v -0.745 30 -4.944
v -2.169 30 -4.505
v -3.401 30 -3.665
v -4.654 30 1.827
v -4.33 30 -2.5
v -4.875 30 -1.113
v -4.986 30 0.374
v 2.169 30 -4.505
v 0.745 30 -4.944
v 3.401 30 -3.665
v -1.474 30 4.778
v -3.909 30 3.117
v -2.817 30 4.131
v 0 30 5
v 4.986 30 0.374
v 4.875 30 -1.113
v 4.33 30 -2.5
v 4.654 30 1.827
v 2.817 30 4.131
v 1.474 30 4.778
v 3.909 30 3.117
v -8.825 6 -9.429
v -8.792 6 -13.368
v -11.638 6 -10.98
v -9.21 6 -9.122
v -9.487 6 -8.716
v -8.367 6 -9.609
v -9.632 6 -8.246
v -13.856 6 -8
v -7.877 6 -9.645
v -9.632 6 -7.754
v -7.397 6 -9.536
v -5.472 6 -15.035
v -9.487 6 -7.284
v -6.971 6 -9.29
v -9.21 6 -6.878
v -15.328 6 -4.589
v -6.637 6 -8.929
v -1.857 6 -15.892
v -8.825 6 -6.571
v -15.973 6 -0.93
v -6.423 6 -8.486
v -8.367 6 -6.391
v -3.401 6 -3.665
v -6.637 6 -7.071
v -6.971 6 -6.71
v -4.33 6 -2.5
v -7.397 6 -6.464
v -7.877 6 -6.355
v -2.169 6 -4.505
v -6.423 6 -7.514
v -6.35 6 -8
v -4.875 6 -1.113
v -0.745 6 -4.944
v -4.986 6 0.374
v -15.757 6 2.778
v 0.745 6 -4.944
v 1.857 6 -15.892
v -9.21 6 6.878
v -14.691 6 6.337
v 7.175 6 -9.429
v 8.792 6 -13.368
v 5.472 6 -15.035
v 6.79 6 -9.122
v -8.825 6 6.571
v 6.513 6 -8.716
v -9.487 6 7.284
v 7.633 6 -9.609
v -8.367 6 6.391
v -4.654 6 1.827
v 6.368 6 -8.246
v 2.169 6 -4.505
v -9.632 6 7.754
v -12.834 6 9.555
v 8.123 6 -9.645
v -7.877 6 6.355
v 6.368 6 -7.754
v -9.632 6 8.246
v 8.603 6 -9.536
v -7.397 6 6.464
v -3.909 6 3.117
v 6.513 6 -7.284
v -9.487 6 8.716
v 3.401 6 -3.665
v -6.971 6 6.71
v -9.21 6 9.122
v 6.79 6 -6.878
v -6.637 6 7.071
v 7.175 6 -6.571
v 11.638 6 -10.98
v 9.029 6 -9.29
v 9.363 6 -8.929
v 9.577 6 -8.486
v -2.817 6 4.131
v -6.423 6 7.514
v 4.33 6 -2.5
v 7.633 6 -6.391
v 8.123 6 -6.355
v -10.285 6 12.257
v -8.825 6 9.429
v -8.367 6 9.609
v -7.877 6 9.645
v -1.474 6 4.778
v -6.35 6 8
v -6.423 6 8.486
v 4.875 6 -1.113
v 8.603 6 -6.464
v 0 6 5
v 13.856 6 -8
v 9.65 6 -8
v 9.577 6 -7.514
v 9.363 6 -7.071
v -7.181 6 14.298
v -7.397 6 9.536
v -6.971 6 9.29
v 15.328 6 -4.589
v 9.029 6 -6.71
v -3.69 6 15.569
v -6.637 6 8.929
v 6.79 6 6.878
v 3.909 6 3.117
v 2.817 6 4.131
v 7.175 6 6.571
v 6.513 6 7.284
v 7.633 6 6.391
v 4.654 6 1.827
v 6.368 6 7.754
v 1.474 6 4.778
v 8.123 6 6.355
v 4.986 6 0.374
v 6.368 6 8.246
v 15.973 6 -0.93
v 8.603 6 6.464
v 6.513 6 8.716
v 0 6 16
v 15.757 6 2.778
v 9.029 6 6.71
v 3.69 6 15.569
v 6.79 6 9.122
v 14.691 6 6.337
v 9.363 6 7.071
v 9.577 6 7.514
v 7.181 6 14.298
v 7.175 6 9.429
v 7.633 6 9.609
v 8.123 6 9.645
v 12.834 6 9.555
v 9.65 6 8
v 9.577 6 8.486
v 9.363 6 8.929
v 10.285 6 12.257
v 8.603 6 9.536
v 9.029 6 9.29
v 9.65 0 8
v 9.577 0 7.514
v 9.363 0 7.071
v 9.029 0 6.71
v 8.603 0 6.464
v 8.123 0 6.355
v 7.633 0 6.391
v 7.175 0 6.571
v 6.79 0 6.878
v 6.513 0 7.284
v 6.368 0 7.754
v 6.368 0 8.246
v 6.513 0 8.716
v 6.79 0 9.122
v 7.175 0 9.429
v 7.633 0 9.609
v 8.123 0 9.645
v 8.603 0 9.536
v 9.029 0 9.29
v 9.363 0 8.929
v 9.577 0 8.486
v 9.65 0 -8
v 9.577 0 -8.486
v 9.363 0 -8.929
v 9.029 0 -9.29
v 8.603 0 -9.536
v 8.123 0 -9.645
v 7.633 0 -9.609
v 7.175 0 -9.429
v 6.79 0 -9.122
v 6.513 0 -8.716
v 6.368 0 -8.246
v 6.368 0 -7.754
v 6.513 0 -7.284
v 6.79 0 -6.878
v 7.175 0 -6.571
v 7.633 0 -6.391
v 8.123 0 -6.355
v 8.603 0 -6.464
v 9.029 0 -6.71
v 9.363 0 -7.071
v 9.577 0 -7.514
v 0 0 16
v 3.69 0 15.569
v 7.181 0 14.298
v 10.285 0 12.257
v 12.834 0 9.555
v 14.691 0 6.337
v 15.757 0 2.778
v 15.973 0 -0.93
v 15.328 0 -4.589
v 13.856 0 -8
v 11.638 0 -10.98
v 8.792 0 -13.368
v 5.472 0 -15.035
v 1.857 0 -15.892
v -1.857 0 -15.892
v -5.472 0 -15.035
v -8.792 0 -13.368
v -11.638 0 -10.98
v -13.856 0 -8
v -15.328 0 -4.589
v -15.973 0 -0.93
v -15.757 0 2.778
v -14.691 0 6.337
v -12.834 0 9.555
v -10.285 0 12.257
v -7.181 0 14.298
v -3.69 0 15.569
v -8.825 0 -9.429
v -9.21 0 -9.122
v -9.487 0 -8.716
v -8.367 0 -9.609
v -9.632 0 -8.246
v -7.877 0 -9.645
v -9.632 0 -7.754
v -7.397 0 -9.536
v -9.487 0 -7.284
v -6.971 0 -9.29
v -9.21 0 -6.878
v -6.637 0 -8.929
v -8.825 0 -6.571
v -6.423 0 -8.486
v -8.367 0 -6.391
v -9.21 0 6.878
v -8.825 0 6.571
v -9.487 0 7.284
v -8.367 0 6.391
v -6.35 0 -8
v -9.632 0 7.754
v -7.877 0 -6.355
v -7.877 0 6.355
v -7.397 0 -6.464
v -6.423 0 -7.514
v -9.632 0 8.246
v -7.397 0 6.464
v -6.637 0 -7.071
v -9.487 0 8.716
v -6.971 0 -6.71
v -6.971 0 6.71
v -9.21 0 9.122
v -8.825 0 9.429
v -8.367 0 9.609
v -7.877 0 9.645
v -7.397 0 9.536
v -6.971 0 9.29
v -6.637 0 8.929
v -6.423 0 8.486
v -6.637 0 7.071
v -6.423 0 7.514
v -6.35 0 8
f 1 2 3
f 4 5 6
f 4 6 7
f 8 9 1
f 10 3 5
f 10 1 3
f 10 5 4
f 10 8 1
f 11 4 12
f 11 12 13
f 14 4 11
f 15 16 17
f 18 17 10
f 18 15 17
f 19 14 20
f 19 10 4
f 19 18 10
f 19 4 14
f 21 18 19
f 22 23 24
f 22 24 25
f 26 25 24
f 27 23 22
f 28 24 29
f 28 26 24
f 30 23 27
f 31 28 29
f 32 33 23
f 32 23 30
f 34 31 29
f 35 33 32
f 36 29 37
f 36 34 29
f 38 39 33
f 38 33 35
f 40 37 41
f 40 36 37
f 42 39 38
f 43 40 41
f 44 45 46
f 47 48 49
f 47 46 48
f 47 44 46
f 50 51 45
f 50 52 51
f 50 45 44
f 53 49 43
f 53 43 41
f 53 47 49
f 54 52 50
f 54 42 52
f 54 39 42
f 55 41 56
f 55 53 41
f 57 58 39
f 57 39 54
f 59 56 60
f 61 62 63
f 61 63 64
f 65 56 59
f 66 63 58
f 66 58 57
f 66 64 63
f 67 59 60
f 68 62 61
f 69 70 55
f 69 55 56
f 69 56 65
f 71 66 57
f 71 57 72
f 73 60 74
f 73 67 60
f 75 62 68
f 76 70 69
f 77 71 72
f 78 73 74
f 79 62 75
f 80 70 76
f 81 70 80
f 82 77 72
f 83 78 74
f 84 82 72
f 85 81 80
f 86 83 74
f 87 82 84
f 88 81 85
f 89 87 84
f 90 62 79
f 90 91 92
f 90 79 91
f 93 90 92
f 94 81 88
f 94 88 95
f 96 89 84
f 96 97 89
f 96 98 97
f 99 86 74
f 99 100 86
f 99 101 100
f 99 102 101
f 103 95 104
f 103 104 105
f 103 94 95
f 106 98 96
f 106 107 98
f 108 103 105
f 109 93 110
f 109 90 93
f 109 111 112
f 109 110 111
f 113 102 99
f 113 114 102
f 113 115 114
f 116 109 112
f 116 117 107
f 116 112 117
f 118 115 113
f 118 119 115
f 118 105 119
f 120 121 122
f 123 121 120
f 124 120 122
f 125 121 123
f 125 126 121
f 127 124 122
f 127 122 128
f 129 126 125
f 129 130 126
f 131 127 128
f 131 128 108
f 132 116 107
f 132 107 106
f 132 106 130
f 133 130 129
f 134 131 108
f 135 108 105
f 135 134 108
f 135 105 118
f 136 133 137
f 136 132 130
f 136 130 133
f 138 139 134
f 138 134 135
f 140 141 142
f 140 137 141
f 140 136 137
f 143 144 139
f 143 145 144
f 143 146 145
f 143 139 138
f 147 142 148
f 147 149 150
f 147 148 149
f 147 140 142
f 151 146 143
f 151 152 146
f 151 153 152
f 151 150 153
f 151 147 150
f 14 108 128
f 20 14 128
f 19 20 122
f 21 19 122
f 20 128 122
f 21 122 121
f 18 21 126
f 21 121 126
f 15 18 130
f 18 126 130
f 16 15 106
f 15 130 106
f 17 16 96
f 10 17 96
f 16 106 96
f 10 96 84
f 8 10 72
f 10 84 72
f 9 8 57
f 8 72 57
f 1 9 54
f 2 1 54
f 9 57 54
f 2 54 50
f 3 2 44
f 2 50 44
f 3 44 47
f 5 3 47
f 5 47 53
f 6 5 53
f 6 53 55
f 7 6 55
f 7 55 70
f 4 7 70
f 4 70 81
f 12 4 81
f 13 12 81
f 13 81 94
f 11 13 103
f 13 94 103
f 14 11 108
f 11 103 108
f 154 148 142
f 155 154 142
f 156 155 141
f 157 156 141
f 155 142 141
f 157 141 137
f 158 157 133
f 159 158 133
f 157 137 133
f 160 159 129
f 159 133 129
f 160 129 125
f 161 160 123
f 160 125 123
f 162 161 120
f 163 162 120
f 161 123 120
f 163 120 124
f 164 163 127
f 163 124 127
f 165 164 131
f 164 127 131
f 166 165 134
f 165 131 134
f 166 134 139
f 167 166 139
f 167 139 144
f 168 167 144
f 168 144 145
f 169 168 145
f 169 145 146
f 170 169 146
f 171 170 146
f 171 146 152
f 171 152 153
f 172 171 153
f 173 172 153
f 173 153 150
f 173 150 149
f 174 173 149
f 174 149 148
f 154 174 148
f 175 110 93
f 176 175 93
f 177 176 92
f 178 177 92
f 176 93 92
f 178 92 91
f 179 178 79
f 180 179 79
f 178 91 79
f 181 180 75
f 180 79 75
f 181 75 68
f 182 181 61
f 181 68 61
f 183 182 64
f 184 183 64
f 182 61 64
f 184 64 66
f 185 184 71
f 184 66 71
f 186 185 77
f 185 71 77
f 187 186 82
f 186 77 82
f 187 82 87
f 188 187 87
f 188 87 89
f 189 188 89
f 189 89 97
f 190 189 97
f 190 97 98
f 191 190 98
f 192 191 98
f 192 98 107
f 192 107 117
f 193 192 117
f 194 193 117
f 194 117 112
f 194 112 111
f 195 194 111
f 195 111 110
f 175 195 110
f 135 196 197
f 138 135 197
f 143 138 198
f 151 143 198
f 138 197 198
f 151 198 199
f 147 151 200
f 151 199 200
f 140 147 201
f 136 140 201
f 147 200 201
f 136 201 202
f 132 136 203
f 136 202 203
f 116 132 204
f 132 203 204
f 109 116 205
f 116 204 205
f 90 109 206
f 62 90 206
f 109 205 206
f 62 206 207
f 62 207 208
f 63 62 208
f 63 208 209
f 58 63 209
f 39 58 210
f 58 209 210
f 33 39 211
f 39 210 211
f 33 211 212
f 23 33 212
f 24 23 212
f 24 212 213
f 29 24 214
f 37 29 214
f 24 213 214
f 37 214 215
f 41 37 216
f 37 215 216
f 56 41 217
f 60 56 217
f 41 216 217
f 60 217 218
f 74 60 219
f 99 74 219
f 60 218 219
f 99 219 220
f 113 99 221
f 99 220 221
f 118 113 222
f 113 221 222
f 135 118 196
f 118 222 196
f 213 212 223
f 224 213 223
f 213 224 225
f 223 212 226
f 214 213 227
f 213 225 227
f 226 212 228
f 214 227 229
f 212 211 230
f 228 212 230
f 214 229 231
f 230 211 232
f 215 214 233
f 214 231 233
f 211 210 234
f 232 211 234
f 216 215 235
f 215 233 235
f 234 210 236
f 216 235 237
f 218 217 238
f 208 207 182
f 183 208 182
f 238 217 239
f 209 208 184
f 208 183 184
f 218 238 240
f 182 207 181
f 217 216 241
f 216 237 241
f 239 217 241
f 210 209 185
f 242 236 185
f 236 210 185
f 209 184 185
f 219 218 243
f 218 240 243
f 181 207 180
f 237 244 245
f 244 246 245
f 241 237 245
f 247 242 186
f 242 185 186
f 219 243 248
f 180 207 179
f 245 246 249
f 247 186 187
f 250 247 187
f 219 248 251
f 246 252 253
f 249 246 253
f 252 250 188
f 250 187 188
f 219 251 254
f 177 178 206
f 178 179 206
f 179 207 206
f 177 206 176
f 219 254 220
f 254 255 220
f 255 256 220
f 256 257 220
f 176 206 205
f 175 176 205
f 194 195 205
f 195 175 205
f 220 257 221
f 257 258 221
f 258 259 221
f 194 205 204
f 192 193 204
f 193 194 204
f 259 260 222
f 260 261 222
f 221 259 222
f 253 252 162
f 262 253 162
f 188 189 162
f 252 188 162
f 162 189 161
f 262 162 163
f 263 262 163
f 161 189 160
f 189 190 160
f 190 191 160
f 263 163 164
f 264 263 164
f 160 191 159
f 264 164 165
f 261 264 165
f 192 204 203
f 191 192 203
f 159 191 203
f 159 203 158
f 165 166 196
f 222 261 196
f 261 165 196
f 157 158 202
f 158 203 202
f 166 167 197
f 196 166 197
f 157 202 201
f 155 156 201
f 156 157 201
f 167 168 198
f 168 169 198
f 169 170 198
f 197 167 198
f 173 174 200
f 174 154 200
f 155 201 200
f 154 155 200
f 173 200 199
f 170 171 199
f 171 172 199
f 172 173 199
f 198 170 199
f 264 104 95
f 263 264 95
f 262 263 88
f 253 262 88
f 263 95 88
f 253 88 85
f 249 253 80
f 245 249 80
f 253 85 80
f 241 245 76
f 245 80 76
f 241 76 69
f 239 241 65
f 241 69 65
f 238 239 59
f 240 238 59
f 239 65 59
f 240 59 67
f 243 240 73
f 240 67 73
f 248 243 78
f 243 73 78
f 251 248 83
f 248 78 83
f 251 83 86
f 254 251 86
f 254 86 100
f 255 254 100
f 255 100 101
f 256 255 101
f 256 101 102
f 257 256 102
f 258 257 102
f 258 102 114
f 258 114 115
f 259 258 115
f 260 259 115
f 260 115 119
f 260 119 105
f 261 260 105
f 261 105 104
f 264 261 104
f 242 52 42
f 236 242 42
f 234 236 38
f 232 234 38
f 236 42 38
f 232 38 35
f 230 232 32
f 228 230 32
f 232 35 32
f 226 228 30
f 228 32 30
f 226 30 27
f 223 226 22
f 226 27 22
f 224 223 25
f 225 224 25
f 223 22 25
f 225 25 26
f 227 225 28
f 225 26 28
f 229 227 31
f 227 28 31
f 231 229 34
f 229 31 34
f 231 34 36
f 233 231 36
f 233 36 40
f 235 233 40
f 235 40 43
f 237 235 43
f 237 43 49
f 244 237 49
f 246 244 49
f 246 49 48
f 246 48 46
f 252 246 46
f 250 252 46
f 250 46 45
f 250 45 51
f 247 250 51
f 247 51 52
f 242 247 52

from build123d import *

# Parameters (mm, degrees)
SKETCH1_R                   = 16
BOSS_EXTRUDE1_DEPTH         = 6
TAP_DRILL_FOR_M4X0_7_TAP1_D = 3.3
SKETCH3_R                   = 5
BOSS_EXTRUDE2_DEPTH         = 24


with BuildPart() as part:
    # Sketch1 → Boss-Extrude1 (new body)
    with BuildSketch(Plane(origin=(0, 0, 0), x_dir=(1, 0, 0), z_dir=(0, 1, 0))):
        with Locations(Location((0, 0, 0), (0, 0, 270))):
            Circle(SKETCH1_R)
    extrude(amount=BOSS_EXTRUDE1_DEPTH)

    # Tap Drill for M4x0.7 Tap1 (through all)
    with Locations(Plane(origin=(0, 0, 0), x_dir=(-1, 0, 0), z_dir=(0, -1, 0))):
        with Locations((-8, 8), (-8, -8), (8, -8), (8, 8)):
            Hole(TAP_DRILL_FOR_M4X0_7_TAP1_D / 2)

    # Sketch3 → Boss-Extrude2 (add)
    with BuildSketch(Plane(origin=(0, 6, 0), x_dir=(1, 0, 0), z_dir=(0, 1, 0))):
        with Locations(Location((0, 0, 0), (0, 0, 270))):
            Circle(SKETCH3_R)
    extrude(amount=BOSS_EXTRUDE2_DEPTH)


solid = part.part
